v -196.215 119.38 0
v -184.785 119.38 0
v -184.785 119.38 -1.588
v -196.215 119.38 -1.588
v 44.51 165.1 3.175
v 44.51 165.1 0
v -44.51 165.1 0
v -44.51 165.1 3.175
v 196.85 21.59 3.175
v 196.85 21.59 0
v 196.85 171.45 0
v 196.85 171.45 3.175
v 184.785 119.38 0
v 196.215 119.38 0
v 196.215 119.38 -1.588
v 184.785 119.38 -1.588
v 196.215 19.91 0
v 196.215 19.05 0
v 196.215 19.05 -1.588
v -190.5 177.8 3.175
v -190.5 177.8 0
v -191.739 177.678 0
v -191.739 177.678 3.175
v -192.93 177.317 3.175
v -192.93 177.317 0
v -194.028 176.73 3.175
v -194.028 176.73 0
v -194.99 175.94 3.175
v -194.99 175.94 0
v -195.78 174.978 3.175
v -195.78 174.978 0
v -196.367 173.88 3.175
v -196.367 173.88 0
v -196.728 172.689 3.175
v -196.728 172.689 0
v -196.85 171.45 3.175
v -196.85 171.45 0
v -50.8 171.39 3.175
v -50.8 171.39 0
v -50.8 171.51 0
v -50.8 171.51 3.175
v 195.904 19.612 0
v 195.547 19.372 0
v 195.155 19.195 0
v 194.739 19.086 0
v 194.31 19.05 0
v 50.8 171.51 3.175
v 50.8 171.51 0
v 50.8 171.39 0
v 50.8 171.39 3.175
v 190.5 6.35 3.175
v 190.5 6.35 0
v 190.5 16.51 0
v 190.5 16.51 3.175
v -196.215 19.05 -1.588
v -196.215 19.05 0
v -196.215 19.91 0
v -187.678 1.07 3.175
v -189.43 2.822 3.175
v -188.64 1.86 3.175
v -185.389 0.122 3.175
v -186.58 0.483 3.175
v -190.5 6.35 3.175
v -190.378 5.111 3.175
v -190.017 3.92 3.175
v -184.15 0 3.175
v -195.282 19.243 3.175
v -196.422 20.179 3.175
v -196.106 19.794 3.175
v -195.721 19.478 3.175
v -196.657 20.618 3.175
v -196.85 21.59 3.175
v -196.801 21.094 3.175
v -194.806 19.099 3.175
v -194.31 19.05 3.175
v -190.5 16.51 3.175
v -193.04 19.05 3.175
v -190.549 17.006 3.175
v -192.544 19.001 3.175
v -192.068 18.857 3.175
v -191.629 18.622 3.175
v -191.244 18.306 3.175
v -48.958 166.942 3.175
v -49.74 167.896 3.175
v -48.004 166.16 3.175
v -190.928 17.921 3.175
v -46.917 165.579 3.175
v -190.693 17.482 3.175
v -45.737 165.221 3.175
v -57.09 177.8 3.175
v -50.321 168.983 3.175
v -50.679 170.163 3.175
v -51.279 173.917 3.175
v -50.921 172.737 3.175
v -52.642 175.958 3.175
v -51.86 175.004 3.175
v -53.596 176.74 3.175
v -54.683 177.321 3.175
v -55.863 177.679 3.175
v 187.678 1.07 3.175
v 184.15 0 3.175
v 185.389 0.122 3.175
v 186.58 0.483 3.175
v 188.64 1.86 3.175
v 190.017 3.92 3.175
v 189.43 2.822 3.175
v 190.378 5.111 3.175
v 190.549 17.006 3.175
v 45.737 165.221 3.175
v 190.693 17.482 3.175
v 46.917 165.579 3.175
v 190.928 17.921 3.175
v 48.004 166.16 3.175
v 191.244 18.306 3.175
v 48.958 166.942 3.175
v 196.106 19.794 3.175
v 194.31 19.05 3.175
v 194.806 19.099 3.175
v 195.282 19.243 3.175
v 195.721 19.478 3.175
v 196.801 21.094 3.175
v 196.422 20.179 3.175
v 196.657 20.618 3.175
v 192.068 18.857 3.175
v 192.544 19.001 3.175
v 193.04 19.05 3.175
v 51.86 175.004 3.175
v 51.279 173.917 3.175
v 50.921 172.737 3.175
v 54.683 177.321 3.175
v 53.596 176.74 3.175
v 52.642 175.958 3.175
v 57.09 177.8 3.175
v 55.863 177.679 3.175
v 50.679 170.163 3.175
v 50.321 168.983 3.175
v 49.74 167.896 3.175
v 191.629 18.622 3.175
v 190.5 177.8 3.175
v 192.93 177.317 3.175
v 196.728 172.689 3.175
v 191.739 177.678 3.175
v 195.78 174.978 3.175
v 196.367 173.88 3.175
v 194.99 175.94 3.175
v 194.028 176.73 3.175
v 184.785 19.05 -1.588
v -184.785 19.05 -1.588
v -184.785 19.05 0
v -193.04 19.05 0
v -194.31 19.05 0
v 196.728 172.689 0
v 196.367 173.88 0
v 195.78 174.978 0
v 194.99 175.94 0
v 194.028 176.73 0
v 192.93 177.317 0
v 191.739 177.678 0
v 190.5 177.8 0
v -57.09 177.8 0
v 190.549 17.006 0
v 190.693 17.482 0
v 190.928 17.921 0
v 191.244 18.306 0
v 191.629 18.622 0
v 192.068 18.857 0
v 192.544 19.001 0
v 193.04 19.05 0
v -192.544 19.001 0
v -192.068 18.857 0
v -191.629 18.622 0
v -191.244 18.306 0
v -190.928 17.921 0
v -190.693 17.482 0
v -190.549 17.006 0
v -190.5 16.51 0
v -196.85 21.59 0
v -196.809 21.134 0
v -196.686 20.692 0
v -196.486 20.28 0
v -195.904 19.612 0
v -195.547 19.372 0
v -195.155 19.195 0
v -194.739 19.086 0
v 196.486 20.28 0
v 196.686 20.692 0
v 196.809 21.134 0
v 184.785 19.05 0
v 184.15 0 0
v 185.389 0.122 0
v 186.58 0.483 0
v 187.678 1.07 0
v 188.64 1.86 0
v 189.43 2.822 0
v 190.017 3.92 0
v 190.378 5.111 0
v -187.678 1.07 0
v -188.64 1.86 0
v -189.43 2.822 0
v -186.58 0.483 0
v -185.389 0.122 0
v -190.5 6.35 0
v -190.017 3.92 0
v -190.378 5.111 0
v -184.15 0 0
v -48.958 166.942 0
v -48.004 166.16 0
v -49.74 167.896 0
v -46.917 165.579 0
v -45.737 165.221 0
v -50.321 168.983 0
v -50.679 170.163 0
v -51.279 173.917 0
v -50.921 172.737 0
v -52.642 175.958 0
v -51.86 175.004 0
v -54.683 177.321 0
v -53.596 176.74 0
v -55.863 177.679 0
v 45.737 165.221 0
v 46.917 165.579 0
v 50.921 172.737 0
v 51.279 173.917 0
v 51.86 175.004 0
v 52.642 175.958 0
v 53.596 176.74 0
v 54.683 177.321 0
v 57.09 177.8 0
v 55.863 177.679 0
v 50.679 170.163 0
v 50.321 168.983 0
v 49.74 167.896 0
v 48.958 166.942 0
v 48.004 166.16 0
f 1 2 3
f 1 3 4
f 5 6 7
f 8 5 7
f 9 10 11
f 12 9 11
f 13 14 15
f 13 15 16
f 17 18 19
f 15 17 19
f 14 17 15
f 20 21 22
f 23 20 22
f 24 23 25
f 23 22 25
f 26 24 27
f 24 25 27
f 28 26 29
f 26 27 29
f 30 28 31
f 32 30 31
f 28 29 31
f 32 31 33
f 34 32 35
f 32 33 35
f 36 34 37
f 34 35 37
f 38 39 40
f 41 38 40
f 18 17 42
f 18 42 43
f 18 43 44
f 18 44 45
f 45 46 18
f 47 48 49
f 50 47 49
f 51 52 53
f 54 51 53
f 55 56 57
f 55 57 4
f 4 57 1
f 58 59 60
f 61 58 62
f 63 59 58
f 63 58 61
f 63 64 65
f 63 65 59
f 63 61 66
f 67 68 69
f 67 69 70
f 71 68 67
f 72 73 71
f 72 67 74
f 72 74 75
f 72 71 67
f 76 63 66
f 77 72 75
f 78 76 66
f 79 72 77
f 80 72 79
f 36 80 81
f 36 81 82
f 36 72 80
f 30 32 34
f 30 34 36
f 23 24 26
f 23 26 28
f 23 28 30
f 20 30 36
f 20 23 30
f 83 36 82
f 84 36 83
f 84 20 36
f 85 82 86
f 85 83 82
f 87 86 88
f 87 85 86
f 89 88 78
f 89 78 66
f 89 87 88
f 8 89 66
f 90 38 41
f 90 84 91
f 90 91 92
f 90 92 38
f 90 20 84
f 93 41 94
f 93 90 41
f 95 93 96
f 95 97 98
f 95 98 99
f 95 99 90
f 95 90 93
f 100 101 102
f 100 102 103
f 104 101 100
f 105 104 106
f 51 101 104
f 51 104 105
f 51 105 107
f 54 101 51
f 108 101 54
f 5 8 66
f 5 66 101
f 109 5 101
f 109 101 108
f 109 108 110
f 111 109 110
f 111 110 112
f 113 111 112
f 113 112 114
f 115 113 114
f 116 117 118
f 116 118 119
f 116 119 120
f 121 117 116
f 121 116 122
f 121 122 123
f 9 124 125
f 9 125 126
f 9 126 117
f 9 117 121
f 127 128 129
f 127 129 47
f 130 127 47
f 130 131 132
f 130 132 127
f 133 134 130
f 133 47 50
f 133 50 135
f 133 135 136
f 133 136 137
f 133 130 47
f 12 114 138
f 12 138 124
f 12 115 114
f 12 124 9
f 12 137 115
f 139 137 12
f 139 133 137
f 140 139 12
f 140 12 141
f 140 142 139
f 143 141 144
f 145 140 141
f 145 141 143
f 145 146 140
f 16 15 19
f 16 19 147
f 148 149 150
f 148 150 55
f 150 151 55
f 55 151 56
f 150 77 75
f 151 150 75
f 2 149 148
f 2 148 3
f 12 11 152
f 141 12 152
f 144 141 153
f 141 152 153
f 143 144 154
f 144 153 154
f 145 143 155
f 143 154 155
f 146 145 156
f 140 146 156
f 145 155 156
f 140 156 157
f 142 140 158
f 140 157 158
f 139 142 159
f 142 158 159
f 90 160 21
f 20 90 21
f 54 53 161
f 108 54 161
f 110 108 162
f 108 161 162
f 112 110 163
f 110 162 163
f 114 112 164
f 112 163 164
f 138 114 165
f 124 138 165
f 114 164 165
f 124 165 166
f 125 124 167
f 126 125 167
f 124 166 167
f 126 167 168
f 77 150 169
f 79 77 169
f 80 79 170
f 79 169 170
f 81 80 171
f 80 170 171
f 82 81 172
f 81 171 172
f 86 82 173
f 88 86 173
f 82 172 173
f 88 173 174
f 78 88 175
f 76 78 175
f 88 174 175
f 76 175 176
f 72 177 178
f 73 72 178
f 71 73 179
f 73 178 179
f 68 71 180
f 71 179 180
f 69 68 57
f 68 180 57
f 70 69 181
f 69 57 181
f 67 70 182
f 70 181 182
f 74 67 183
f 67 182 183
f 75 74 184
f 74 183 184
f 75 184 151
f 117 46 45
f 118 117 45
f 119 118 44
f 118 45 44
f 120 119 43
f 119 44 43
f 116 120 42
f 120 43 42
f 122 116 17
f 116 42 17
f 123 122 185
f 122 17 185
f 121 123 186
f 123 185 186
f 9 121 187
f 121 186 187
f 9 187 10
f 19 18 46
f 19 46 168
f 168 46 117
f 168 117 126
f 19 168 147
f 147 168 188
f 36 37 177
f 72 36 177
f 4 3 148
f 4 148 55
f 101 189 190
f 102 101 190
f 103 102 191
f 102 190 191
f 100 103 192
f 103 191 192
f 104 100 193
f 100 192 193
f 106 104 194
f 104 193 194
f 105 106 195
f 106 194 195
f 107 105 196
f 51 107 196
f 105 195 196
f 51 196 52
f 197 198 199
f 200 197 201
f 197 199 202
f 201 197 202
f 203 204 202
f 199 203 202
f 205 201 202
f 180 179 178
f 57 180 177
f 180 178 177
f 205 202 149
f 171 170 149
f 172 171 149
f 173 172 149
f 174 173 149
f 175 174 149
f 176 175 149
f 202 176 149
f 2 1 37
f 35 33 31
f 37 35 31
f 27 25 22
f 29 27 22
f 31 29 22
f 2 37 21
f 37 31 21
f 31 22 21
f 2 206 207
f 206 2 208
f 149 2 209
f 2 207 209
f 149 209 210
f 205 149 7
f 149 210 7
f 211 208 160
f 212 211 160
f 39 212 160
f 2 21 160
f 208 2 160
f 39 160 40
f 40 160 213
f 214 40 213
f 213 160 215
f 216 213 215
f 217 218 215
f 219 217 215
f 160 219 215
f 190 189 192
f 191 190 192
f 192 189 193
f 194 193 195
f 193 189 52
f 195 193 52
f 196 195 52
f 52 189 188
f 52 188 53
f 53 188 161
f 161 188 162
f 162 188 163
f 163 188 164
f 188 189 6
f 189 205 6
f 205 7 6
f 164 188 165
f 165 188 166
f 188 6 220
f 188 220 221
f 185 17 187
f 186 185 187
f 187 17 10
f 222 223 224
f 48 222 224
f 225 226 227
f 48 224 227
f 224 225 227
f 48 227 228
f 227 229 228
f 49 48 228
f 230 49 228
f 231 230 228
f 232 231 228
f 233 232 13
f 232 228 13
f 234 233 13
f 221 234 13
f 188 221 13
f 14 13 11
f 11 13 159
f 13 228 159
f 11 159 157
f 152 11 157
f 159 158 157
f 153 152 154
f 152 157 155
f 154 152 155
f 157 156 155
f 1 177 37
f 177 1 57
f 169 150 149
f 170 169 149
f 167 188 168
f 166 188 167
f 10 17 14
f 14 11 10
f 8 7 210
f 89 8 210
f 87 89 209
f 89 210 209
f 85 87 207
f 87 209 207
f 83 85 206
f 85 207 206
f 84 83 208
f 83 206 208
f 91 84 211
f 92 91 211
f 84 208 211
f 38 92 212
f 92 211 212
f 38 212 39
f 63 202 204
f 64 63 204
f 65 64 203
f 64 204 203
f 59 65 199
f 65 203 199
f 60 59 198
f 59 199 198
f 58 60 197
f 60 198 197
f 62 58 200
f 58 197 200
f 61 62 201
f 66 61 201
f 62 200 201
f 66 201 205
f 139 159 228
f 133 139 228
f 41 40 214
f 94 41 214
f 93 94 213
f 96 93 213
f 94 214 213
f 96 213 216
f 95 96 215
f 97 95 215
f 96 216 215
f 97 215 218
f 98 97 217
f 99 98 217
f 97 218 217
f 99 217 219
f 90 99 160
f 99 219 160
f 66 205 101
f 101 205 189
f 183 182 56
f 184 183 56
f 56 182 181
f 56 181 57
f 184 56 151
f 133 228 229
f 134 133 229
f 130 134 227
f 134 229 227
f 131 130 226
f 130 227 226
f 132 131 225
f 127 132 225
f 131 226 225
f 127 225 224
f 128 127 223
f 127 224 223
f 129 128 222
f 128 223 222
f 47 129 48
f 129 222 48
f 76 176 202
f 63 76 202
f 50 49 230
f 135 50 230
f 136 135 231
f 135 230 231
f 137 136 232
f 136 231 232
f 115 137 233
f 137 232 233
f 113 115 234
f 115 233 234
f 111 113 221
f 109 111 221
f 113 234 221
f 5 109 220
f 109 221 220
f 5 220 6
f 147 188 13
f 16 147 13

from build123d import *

# Parameters (mm, degrees)
BOSS_EXTRUDE1_DEPTH = 3.175
SKETCH2_W           = 11.43
SKETCH2_H           = 100.33
BOSS_EXTRUDE2_DEPTH = 1.5875


with BuildPart() as part:
    # Sketch1 → Boss-Extrude1 (new body)
    with BuildSketch(Plane.XY):
        with BuildLine():
            Line((-50.8, 171.390190343), (-50.8, 171.509809657))
            ThreePointArc((-50.8, 171.509809657), (-52.642354096, 175.957645904), (-57.090190343, 177.8))
            Line((-57.090190343, 177.8), (-190.5, 177.8))
            ThreePointArc((-190.5, 177.8), (-194.990128061, 175.940128061), (-196.85, 171.45))
            Line((-196.85, 171.45), (-196.85, 21.59))
            ThreePointArc((-196.85, 21.59), (-196.106051224, 19.793948776), (-194.31, 19.05))
            Line((-194.31, 19.05), (-193.04, 19.05))
            ThreePointArc((-193.04, 19.05), (-191.243948776, 18.306051224), (-190.5, 16.51))
            Line((-190.5, 16.51), (-190.5, 6.35))
            ThreePointArc((-190.5, 6.35), (-188.640128061, 1.859871939), (-184.15, 0))
            Line((-184.15, 0), (184.15, 0))
            ThreePointArc((184.15, 0), (188.640128061, 1.859871939), (190.5, 6.35))
            Line((190.5, 6.35), (190.5, 16.51))
            ThreePointArc((190.5, 16.51), (191.243948776, 18.306051224), (193.04, 19.05))
            Line((193.04, 19.05), (194.31, 19.05))
            ThreePointArc((194.31, 19.05), (196.106051224, 19.793948776), (196.85, 21.59))
            Line((196.85, 21.59), (196.85, 171.45))
            ThreePointArc((196.85, 171.45), (194.990128061, 175.940128061), (190.5, 177.8))
            Line((190.5, 177.8), (57.090190343, 177.8))
            ThreePointArc((57.090190343, 177.8), (52.642354096, 175.957645904), (50.8, 171.509809657))
            Line((50.8, 171.509809657), (50.8, 171.390190343))
            ThreePointArc((50.8, 171.390190343), (48.957645904, 166.942354096), (44.509809657, 165.1))
            Line((44.509809657, 165.1), (-44.509809657, 165.1))
            ThreePointArc((-44.509809657, 165.1), (-48.957645904, 166.942354096), (-50.8, 171.390190343))
        make_face()
    extrude(amount=BOSS_EXTRUDE1_DEPTH)

    # Sketch2 → Boss-Extrude2 (add)
    with BuildSketch(Plane(origin=(0, 0, 0), x_dir=(-1, 0, 0), z_dir=(0, 0, -1))):
        with Locations((-190.5, 69.215)):
            Rectangle(SKETCH2_W, SKETCH2_H)
        with Locations((190.5, 69.215)):
            Rectangle(SKETCH2_W, SKETCH2_H)
    extrude(amount=BOSS_EXTRUDE2_DEPTH)


solid = part.part
